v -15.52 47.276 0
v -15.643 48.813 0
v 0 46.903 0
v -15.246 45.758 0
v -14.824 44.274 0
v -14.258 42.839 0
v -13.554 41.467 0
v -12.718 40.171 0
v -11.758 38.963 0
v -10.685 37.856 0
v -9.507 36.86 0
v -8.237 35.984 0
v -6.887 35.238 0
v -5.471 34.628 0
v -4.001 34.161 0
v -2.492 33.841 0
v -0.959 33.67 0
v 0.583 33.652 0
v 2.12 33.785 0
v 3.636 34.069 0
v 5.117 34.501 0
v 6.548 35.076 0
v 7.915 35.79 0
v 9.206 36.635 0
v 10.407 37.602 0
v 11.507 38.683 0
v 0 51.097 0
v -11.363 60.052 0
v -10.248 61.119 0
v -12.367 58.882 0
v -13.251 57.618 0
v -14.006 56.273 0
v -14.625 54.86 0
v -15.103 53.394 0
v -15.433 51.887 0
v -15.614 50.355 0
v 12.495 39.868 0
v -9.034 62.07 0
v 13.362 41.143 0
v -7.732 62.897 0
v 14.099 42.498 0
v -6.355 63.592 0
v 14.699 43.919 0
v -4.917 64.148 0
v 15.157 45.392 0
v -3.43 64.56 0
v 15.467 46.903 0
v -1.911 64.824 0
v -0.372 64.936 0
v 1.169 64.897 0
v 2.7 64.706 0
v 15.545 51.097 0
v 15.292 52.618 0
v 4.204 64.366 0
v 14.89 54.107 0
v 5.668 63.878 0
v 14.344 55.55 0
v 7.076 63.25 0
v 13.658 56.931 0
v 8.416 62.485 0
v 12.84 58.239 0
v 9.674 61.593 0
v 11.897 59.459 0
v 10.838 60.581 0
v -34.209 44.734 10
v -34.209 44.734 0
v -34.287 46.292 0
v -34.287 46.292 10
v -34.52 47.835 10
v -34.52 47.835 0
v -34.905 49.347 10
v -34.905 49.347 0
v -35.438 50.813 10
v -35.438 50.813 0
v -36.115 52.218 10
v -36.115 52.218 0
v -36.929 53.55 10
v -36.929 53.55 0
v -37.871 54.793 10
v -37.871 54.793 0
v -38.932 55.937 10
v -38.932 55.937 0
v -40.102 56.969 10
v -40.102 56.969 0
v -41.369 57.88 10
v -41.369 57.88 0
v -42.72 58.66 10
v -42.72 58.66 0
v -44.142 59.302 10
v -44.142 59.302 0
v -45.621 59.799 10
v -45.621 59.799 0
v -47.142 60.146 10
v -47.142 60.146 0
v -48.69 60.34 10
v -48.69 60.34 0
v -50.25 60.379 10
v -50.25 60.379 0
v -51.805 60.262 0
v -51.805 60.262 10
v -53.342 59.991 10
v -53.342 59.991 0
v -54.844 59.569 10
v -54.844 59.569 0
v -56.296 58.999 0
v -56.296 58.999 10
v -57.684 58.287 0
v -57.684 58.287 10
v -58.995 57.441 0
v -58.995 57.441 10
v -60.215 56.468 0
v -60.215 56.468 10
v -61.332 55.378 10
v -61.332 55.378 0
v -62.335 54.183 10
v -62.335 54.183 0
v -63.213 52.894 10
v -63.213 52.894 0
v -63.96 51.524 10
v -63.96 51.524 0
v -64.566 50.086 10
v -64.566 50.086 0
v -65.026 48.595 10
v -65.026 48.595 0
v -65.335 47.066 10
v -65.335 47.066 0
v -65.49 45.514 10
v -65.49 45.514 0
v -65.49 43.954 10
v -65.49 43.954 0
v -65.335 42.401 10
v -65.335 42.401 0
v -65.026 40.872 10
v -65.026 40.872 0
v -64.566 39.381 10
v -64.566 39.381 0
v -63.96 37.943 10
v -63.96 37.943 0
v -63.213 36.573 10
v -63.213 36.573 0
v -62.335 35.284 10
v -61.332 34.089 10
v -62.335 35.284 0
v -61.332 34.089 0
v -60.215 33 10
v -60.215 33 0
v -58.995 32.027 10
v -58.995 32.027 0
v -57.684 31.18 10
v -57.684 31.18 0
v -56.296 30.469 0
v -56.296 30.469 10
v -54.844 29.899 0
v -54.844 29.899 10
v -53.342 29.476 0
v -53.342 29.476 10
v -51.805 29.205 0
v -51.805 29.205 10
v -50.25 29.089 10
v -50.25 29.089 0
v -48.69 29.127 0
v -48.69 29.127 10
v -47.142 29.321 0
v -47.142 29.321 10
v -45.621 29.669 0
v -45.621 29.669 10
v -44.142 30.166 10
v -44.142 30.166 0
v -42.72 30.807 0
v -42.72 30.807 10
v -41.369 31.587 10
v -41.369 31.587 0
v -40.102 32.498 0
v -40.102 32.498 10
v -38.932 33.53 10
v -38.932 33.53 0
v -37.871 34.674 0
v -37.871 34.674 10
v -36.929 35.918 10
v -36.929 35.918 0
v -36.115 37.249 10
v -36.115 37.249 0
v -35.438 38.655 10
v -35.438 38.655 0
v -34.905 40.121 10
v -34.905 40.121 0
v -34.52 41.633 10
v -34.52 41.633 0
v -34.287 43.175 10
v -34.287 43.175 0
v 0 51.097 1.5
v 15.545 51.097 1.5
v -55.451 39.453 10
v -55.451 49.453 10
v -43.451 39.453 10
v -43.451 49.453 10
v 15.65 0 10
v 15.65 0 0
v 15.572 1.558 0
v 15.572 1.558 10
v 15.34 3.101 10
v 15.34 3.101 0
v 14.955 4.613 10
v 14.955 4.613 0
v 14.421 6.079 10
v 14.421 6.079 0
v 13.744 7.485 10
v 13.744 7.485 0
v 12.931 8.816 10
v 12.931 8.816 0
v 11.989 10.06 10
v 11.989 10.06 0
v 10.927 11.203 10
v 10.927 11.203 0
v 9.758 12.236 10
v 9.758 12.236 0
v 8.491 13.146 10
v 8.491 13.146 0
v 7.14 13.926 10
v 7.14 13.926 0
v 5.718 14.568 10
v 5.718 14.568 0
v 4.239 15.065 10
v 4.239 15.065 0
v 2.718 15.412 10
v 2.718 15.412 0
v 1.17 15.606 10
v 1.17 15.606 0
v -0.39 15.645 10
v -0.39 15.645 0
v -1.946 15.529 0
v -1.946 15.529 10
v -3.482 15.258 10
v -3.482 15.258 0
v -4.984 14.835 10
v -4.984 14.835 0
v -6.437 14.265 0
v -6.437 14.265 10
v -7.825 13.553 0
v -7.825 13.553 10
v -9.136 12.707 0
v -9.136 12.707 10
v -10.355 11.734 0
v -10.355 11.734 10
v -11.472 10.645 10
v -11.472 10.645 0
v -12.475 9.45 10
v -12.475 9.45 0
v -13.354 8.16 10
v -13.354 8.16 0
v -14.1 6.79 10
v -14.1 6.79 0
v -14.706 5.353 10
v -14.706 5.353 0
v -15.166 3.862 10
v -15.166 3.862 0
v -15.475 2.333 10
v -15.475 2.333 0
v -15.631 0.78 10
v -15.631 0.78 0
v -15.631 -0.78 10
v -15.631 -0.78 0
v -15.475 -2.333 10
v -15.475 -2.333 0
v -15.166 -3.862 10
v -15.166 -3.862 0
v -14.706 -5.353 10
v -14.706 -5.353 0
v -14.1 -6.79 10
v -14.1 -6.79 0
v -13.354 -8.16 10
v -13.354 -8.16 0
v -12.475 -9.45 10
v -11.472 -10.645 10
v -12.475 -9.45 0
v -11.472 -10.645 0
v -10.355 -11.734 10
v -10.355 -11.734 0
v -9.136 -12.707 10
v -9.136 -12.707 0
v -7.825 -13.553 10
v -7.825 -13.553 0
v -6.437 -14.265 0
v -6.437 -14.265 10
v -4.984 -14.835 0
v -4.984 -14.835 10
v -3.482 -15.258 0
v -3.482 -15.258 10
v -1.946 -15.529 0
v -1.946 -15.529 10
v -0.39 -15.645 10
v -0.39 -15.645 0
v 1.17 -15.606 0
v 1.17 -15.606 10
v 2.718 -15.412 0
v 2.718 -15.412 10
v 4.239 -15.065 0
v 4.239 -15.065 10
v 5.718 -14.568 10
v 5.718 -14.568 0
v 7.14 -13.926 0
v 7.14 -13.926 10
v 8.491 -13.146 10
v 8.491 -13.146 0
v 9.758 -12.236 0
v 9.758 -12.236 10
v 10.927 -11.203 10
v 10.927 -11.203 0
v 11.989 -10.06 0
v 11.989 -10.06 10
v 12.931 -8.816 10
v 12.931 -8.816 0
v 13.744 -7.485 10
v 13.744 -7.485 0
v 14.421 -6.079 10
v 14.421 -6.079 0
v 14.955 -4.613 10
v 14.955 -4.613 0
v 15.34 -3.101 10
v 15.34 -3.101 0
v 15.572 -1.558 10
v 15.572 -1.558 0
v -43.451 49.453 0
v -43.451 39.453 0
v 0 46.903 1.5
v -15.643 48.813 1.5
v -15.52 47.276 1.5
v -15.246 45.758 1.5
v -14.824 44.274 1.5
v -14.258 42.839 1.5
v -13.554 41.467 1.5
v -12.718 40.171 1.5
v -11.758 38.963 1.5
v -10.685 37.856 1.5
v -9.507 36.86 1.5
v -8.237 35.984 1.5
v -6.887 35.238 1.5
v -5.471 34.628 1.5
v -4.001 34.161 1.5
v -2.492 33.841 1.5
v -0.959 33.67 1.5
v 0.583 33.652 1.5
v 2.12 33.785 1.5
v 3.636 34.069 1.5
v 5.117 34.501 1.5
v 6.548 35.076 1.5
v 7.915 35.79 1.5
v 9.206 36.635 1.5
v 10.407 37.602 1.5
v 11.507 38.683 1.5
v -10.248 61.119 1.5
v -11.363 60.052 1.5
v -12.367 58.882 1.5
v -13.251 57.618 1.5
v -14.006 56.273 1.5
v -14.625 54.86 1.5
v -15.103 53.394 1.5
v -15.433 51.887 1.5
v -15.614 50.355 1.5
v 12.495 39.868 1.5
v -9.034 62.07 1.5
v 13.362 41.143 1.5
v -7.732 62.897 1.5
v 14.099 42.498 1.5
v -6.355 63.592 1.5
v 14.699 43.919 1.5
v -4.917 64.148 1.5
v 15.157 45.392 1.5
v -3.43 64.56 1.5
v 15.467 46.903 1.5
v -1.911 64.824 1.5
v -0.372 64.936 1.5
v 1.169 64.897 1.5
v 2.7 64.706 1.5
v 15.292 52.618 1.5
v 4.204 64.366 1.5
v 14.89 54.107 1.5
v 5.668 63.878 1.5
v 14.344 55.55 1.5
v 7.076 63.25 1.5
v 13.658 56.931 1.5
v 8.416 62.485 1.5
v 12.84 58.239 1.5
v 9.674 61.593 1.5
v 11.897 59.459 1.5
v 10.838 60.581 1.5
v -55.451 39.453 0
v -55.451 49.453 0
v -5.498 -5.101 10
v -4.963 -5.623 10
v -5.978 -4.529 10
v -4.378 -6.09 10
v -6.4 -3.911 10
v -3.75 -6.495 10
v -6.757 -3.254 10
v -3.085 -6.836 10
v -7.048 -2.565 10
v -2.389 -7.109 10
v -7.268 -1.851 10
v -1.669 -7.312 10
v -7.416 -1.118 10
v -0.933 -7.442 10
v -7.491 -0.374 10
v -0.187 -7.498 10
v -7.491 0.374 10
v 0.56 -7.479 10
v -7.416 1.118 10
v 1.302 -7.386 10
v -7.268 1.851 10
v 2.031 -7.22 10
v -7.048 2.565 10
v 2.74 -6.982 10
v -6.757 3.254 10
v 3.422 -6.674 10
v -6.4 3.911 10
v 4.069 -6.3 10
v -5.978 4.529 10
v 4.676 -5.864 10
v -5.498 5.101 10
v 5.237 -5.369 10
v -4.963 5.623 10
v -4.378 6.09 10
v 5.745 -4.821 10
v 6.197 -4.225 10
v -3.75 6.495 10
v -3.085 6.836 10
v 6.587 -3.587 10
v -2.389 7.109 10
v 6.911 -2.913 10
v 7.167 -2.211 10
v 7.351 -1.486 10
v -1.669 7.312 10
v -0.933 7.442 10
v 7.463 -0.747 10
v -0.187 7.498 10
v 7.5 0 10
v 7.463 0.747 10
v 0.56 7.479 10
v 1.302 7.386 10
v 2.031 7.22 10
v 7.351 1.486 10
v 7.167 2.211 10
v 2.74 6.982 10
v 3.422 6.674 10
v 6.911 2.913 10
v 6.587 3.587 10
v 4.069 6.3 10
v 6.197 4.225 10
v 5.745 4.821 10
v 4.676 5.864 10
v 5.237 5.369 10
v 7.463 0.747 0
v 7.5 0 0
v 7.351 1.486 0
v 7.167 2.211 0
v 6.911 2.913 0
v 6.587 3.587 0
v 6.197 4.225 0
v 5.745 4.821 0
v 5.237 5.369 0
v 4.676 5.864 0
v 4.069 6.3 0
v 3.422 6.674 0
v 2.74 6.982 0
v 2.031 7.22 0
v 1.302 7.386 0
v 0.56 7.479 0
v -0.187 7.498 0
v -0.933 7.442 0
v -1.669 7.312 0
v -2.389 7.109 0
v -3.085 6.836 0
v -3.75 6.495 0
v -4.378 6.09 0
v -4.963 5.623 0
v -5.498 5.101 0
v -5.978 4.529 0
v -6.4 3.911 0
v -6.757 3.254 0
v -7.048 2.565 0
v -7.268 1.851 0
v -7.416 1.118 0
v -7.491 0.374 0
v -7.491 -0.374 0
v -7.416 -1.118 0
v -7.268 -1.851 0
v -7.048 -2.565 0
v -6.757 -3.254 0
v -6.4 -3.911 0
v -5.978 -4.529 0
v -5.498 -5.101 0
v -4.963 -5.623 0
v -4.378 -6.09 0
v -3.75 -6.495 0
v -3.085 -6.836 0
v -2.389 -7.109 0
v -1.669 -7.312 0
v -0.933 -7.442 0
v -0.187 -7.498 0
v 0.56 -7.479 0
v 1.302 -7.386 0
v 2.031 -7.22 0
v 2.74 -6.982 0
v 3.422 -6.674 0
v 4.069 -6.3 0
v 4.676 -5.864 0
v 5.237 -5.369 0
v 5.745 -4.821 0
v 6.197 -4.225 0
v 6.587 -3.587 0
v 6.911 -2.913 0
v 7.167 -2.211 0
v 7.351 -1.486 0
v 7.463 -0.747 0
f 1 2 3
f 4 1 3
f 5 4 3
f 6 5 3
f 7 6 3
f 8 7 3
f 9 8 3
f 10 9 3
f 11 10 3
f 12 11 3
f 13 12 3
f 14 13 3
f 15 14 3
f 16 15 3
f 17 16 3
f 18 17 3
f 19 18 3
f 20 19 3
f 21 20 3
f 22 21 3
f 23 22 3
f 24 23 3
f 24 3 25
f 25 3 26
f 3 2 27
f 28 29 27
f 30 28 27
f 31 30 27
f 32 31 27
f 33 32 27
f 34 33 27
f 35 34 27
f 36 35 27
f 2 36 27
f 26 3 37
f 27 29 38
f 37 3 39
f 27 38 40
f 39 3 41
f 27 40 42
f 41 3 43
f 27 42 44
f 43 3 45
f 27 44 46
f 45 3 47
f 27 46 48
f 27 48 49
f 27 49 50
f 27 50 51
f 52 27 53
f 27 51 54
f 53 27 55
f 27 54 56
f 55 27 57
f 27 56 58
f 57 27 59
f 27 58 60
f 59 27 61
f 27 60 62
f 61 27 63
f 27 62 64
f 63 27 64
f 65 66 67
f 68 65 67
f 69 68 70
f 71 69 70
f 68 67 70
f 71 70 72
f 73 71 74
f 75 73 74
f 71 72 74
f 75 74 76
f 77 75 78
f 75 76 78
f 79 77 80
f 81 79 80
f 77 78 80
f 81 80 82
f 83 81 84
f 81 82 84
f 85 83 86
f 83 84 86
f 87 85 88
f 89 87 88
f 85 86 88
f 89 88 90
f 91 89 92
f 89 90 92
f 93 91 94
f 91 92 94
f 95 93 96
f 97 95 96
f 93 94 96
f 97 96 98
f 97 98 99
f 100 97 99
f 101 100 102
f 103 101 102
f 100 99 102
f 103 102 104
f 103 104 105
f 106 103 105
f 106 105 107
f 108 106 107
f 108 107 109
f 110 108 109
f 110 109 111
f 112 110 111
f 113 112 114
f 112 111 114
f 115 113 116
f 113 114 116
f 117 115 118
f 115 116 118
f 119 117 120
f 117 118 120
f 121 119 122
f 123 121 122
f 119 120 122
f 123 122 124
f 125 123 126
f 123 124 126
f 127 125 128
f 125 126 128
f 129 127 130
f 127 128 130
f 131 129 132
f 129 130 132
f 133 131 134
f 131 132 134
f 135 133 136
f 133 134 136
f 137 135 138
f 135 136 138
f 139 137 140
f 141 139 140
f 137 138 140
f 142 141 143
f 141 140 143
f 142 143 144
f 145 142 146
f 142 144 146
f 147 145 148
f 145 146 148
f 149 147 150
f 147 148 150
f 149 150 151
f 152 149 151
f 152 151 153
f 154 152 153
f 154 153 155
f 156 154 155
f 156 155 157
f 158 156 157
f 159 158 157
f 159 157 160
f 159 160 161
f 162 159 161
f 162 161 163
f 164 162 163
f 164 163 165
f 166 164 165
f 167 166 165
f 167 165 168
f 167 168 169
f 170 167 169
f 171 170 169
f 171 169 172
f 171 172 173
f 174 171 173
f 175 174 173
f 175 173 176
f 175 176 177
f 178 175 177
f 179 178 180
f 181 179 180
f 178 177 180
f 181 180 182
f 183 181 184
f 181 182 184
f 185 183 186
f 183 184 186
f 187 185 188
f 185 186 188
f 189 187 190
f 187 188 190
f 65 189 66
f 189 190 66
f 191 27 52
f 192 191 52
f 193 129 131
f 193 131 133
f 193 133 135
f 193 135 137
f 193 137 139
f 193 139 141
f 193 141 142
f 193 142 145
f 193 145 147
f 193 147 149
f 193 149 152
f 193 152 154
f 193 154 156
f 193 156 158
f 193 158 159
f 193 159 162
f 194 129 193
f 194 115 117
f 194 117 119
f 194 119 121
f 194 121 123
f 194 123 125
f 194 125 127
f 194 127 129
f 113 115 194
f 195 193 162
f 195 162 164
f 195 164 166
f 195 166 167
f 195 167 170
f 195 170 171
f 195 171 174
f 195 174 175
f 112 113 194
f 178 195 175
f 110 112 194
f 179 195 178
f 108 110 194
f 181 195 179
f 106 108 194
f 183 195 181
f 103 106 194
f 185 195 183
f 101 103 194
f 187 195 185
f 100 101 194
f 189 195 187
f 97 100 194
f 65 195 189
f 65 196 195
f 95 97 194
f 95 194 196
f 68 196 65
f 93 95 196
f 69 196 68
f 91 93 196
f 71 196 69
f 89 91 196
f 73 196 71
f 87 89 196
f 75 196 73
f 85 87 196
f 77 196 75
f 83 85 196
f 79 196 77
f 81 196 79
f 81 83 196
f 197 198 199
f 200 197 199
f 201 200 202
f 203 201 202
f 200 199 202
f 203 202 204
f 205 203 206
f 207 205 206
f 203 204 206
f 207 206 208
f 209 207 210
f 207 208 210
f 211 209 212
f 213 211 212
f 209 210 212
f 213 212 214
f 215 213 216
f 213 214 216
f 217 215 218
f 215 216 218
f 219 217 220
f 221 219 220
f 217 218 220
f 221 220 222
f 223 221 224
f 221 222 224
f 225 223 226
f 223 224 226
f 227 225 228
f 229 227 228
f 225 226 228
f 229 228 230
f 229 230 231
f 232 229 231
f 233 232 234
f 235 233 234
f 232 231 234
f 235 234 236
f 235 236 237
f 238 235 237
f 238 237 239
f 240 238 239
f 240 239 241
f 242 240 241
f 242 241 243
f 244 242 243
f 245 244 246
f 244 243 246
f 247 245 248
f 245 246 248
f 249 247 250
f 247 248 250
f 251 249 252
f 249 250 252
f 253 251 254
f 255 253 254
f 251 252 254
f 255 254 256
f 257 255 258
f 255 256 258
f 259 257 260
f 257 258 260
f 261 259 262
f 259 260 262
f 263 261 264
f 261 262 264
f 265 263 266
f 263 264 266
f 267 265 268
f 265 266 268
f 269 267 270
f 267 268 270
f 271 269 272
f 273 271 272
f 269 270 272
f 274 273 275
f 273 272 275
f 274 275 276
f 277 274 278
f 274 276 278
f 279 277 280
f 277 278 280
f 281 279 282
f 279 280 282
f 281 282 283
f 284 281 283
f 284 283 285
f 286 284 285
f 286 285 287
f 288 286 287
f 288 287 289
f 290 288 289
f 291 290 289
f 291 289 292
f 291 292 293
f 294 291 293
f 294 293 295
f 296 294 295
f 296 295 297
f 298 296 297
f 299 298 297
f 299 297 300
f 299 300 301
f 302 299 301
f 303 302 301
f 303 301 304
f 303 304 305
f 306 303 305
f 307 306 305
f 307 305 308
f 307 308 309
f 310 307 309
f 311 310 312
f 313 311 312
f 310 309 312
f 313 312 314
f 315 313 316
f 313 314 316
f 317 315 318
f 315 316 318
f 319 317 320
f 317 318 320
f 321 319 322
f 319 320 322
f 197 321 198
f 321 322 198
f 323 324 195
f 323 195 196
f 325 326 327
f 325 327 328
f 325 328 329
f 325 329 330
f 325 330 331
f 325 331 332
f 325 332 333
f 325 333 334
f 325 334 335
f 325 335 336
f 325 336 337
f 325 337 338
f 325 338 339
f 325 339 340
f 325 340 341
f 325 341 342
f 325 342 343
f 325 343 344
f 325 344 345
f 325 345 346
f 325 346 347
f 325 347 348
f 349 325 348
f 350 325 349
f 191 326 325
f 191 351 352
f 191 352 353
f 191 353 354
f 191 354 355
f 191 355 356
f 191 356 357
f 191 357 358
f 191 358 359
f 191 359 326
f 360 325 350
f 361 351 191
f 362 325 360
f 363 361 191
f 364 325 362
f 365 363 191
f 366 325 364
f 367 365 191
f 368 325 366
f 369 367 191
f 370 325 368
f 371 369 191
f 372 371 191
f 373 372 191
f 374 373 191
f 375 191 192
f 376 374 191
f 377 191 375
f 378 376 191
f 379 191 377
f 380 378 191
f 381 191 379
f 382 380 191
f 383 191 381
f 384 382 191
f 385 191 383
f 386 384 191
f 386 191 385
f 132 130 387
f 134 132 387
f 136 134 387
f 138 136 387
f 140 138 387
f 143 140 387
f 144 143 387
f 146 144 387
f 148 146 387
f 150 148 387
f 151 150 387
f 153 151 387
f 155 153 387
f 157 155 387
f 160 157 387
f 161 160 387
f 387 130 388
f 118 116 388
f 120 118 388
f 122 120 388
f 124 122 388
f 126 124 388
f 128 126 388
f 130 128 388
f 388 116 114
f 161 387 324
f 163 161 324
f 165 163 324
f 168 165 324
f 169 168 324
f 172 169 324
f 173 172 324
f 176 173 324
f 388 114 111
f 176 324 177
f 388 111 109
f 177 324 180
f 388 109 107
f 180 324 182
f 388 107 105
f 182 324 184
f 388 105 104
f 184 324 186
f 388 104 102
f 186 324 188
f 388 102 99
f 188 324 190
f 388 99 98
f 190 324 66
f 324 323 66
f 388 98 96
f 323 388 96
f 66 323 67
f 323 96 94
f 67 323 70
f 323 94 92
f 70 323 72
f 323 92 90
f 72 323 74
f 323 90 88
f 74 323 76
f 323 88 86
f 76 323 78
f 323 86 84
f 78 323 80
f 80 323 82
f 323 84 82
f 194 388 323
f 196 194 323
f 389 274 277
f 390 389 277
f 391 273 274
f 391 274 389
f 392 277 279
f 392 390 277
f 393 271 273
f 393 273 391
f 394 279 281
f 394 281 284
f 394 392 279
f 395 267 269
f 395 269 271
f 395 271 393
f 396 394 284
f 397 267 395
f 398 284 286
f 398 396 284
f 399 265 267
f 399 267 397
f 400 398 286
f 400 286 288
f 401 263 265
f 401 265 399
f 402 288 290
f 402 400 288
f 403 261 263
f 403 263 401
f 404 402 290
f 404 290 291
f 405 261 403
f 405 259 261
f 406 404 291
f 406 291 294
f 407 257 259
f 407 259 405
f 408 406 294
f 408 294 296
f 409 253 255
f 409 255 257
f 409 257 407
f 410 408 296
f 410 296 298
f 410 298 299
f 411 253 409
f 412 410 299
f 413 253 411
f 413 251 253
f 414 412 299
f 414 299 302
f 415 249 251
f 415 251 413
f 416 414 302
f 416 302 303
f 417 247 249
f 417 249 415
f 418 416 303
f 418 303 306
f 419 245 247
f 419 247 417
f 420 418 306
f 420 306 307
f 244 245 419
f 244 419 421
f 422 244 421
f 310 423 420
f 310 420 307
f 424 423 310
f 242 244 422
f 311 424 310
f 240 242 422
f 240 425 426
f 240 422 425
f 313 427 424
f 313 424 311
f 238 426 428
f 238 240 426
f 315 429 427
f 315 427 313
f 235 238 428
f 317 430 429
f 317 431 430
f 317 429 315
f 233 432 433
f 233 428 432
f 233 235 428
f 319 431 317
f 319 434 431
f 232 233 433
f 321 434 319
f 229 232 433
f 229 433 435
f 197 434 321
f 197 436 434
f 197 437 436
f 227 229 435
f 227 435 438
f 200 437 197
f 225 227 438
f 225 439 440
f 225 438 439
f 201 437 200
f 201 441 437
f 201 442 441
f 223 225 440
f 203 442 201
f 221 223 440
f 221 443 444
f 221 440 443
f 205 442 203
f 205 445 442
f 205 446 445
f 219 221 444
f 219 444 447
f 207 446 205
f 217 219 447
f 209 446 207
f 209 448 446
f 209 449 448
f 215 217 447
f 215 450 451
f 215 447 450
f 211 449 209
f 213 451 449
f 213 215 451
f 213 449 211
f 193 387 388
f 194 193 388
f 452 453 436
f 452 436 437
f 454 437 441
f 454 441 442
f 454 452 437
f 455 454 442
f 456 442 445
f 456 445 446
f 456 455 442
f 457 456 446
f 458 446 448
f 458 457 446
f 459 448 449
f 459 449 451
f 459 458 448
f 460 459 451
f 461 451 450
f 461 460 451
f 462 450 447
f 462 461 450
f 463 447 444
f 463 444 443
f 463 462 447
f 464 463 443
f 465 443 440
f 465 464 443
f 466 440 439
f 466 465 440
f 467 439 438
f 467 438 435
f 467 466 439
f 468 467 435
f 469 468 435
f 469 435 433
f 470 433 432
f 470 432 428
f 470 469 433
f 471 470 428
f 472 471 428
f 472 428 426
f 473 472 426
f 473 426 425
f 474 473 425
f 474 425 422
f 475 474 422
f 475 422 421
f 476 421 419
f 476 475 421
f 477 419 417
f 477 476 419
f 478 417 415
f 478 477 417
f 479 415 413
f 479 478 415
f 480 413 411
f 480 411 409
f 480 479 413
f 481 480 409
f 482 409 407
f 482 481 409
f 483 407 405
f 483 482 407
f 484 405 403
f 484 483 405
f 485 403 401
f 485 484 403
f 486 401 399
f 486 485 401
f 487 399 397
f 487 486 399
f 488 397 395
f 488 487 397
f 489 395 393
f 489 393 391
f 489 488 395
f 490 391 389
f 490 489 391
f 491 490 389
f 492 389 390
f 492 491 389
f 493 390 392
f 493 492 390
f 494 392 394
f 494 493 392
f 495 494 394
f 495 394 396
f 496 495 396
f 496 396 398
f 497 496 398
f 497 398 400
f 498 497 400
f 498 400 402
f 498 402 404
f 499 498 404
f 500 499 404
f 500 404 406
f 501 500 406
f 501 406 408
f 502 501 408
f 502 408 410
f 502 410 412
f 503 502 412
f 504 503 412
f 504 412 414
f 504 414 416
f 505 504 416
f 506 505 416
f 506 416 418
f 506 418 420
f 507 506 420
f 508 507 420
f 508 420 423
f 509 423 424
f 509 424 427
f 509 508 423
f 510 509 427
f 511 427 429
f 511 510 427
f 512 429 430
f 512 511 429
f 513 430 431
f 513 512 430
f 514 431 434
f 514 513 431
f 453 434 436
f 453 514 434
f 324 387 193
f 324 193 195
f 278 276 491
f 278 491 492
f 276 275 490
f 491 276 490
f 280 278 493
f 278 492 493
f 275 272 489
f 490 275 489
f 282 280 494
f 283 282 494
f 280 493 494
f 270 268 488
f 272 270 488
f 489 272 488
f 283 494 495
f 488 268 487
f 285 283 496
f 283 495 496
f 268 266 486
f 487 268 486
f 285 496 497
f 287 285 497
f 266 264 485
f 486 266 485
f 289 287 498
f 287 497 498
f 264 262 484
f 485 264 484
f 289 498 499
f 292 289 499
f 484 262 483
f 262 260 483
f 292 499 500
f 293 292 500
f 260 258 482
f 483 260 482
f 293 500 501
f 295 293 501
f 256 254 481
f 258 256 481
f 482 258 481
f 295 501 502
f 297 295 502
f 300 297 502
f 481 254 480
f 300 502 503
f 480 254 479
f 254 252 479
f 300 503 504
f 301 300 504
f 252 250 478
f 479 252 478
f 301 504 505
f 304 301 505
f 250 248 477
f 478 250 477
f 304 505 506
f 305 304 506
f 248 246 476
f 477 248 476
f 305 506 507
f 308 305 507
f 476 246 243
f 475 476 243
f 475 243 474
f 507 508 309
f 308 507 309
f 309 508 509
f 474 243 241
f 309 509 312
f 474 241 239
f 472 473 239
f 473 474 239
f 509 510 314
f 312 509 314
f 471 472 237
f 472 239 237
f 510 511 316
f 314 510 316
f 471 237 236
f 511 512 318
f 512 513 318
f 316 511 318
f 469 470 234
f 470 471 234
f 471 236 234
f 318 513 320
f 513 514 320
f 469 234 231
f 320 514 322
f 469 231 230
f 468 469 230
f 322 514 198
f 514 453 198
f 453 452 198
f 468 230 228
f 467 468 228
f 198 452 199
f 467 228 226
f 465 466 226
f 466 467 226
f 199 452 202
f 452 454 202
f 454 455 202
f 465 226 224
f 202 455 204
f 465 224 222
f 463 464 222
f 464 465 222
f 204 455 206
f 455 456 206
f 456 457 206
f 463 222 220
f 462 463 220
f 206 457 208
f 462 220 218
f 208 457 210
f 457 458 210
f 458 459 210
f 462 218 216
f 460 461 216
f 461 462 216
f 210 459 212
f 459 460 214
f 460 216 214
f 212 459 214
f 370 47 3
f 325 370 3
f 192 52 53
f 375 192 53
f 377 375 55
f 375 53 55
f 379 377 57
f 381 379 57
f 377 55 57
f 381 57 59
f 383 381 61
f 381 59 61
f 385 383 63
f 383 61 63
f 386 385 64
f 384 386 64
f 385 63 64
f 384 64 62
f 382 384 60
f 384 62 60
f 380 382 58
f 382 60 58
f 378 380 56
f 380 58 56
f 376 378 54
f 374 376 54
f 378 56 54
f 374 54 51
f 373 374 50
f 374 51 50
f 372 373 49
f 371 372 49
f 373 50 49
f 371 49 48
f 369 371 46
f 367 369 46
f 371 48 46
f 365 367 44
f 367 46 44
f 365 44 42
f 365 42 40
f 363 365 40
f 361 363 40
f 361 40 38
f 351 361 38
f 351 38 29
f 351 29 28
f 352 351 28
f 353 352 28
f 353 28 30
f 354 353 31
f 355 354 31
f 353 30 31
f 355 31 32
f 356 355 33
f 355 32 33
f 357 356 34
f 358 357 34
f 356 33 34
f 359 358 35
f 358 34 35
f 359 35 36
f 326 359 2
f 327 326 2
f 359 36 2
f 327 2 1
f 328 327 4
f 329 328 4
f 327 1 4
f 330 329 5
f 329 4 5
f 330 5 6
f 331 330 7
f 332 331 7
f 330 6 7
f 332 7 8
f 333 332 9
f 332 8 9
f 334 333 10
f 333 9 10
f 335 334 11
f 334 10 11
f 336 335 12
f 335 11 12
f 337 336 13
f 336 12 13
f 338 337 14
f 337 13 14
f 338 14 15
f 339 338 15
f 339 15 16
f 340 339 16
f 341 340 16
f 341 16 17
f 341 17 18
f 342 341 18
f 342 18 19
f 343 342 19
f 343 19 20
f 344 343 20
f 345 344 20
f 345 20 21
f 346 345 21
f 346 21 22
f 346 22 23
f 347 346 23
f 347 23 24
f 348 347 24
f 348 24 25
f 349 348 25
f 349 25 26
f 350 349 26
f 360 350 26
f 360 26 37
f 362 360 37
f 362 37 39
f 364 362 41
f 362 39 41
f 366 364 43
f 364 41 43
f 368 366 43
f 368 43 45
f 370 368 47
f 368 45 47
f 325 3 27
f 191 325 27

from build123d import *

# Parameters (mm, degrees)
F0_R     = 15.65
F0_R_2   = 7.5
F1_DEPTH = 10
F2_R     = 15.65
F2_W     = 12
F2_H     = 10
F3_DEPTH = 10
F5_DEPTH = 1.5


with BuildPart() as f1:
    # F0 (on Top) → F1 (new body)
    with BuildSketch(Plane.XY):
        Circle(F0_R)
        Circle(F0_R_2, mode=Mode.SUBTRACT)
    extrude(amount=F1_DEPTH)


with BuildPart() as f3:
    # F2 (on Top) → F3 (new body)
    with BuildSketch(Plane.XY):
        with Locations((-49.859468, 44.733729)):
            Circle(F2_R)
        with Locations((-49.451185, 44.452665)):
            Rectangle(F2_W, F2_H, mode=Mode.SUBTRACT)
    extrude(amount=F3_DEPTH)


with BuildPart() as f5:
    # F4 (on Top) → F5 (new body)
    with BuildSketch(Plane.XY):
        with BuildLine():
            Line((0, 51.096842), (15.545448, 51.096842))
            ThreePointArc((15.545448, 51.096842), (-15.647246, 49.584437), (15.466766, 46.903055))
            Line((15.466766, 46.903055), (0, 46.903055))
            Line((0, 46.903055), (0, 51.096842))
        make_face()
    extrude(amount=F5_DEPTH)


solid = Compound([f1.part, f3.part, f5.part])
